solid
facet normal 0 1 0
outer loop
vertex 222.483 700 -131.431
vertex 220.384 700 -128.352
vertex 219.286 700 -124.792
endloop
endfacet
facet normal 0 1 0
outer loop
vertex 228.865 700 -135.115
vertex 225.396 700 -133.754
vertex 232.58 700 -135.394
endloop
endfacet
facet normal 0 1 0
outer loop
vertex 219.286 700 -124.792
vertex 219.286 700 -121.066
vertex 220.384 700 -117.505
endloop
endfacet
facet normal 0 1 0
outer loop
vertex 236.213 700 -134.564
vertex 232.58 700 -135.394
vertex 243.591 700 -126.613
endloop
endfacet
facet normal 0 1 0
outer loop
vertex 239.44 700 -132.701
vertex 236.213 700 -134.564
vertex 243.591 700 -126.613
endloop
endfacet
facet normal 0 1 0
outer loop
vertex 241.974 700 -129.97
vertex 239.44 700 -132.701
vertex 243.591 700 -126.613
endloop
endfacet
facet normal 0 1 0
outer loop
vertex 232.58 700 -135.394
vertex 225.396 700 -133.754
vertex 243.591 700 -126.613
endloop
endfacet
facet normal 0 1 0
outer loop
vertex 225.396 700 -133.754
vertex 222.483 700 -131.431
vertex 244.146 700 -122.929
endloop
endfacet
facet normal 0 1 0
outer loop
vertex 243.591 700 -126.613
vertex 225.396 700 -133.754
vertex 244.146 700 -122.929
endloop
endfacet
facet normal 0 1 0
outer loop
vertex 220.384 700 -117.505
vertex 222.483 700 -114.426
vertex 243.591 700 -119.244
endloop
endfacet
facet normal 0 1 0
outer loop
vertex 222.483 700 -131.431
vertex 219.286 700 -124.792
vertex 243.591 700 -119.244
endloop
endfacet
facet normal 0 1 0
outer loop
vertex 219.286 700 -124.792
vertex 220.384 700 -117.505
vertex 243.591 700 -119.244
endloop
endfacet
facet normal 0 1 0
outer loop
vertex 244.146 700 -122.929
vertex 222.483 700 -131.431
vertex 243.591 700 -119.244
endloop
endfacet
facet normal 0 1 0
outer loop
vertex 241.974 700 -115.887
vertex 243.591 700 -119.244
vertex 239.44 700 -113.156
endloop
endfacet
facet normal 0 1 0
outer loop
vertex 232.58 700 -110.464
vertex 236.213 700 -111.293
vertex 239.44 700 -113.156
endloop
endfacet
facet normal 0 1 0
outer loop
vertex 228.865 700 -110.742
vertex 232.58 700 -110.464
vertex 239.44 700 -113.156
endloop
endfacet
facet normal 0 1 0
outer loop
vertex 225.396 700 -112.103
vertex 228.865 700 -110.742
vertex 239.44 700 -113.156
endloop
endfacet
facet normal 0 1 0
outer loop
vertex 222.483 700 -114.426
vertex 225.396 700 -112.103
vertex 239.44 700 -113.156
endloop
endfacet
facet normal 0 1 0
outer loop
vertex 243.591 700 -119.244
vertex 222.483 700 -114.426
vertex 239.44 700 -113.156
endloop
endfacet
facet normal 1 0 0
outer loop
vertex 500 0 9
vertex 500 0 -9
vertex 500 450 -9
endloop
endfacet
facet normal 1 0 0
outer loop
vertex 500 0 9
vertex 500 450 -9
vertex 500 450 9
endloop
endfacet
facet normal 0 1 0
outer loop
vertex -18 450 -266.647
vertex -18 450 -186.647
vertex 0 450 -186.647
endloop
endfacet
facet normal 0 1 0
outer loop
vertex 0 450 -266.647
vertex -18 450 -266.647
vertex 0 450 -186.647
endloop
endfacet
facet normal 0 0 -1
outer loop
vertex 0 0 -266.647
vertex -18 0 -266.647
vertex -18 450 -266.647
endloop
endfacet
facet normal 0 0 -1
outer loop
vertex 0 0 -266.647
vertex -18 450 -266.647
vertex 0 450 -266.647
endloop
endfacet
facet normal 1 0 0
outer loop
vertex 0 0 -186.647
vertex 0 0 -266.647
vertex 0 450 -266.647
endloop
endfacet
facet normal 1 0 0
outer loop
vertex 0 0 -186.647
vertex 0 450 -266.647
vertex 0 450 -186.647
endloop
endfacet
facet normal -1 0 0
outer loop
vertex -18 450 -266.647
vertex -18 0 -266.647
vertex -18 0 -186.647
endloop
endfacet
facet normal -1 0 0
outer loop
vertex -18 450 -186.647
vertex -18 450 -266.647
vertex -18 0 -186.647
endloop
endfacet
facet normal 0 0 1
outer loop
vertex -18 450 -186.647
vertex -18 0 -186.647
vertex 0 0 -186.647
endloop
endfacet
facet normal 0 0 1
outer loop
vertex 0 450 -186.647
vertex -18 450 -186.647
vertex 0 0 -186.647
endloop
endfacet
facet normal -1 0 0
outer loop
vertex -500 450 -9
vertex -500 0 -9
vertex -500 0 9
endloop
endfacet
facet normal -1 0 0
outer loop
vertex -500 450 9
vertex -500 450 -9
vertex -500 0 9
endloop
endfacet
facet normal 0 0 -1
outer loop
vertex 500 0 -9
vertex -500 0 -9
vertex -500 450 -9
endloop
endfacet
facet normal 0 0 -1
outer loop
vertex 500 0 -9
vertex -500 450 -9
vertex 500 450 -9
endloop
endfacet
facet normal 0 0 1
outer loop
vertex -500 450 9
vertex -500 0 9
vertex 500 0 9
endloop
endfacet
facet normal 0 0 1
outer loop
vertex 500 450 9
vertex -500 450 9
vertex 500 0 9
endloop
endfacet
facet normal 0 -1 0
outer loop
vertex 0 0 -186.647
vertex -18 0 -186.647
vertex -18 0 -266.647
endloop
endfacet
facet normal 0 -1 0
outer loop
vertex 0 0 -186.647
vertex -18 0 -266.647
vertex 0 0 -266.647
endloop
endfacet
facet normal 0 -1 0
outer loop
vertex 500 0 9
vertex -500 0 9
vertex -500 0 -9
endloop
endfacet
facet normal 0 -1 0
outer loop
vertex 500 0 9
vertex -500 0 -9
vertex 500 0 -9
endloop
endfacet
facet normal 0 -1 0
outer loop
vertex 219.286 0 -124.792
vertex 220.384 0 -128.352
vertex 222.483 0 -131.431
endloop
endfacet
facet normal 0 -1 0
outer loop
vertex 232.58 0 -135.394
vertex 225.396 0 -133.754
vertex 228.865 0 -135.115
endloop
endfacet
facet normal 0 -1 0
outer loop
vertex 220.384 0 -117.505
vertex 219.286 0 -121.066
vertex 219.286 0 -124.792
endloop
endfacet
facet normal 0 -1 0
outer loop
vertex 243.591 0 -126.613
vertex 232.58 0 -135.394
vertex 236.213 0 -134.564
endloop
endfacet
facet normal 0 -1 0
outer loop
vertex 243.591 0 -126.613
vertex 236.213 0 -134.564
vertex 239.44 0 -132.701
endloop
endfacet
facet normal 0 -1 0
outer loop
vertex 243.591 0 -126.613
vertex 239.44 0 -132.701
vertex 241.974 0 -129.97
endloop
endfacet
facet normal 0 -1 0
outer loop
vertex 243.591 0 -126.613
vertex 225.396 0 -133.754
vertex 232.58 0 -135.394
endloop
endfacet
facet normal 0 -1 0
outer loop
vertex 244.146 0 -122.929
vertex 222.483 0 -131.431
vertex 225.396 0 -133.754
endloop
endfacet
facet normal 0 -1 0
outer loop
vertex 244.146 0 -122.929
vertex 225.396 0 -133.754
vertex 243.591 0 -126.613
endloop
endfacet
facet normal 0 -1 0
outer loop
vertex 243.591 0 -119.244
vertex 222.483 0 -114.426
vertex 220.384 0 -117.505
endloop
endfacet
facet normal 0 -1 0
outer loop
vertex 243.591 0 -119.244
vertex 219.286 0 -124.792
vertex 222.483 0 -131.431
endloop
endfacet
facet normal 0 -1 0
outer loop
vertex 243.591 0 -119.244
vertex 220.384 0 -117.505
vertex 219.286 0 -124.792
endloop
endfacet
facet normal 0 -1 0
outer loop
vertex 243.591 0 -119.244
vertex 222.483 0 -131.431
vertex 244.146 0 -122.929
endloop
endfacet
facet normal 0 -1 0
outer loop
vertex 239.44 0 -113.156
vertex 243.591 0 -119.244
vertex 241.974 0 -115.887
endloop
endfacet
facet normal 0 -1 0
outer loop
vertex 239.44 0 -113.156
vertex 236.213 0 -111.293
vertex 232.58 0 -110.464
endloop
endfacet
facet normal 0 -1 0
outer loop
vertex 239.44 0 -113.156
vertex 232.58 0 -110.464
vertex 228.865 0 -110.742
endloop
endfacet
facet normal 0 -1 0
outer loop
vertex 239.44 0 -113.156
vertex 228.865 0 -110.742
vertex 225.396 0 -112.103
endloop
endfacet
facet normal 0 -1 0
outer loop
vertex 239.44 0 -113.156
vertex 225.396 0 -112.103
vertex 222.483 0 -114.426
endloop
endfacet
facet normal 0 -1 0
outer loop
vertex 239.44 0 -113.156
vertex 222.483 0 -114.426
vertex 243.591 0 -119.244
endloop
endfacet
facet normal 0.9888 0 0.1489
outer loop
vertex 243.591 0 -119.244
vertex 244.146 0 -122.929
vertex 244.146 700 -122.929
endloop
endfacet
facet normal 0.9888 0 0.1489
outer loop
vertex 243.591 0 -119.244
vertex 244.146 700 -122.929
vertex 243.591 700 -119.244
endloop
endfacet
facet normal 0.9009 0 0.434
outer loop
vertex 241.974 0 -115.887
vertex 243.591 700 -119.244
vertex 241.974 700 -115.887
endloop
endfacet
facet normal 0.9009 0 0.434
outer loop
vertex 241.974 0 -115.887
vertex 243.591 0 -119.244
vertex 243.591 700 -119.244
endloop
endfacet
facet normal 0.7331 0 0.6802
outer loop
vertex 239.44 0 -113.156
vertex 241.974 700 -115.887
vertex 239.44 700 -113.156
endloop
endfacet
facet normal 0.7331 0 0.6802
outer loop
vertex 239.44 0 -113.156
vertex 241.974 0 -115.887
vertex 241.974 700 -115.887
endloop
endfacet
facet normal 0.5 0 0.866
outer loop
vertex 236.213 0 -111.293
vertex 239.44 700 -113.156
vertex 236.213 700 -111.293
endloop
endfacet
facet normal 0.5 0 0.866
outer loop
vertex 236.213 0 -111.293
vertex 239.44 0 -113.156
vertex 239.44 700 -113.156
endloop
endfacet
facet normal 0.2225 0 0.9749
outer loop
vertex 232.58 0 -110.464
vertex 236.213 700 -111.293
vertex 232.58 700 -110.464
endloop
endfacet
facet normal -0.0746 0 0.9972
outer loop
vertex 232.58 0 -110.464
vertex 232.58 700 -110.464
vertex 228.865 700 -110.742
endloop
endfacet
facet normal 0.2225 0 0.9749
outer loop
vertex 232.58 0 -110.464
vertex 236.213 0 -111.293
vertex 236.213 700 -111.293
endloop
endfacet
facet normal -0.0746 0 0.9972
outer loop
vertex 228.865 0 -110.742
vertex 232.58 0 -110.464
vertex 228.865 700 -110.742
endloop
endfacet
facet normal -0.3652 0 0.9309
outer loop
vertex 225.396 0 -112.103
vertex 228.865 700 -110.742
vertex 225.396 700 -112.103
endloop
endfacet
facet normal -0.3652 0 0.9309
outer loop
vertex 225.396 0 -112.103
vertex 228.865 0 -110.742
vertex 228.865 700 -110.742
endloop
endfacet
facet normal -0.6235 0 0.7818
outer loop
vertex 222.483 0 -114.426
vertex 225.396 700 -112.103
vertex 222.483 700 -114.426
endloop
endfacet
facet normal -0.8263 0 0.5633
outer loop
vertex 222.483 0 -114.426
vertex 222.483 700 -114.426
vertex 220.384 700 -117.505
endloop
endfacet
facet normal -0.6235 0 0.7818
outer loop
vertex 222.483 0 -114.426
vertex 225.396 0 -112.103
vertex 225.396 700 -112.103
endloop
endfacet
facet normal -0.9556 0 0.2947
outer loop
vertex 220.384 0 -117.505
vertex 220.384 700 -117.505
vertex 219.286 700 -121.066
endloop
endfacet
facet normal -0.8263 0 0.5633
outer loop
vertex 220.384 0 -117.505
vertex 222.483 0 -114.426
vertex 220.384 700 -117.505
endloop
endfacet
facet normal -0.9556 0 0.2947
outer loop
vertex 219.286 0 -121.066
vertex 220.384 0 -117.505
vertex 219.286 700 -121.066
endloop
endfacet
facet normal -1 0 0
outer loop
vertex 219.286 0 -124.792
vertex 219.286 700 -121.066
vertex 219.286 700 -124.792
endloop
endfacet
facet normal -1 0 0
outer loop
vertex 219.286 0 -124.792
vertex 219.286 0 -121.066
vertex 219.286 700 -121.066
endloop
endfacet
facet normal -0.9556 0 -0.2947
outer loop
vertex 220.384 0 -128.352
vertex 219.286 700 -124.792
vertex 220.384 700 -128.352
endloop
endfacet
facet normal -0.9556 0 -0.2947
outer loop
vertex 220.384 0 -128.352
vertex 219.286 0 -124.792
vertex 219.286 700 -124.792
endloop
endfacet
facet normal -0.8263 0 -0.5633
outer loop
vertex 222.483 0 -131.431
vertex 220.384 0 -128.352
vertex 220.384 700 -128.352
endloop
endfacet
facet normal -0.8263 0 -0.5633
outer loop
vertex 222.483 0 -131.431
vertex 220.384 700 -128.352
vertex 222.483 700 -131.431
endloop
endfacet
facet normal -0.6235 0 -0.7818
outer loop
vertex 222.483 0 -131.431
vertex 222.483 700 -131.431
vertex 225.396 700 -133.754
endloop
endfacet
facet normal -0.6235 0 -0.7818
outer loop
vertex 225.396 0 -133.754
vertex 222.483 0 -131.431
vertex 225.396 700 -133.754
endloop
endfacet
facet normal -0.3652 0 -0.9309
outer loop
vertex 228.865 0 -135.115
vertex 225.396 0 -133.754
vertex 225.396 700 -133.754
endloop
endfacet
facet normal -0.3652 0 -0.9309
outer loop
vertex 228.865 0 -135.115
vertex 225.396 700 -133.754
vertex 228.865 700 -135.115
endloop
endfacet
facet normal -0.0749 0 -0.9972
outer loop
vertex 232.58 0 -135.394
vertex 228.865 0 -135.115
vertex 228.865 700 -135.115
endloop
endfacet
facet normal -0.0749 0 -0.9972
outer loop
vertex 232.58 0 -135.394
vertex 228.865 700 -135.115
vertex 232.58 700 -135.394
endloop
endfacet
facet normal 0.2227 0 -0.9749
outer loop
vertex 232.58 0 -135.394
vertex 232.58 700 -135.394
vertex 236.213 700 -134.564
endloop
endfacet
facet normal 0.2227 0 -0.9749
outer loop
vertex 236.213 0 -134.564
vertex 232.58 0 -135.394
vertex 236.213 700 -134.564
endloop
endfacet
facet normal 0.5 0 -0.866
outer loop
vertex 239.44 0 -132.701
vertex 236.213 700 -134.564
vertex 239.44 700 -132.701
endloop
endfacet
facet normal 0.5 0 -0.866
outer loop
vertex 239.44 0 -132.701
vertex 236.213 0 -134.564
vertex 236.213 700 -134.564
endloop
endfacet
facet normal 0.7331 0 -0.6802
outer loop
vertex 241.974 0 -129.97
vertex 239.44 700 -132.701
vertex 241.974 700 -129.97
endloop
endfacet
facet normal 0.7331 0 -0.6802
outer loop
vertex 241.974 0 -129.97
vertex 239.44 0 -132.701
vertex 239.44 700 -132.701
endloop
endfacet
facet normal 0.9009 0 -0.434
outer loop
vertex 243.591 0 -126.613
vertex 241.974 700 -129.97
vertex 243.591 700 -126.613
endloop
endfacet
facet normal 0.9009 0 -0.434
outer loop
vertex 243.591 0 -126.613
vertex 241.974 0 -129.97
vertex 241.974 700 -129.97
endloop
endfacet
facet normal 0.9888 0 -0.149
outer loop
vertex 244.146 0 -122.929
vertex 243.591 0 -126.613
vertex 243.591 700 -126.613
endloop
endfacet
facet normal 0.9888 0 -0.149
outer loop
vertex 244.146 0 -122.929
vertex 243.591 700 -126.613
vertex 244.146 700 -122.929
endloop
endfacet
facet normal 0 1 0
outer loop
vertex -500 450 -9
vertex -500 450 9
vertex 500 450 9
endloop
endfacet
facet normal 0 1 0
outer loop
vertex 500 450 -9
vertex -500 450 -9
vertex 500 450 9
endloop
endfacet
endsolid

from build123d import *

# Parameters (mm, degrees)
F0_W     = 1000
F0_H     = 18
F1_DEPTH = 450
F2_W     = 18
F2_H     = 80
F3_DEPTH = 450
F4_R     = 12.5
F5_DEPTH = 700


with BuildPart() as f1:
    # F0 (on Front) → F1 (new body)
    with BuildSketch(Plane.XZ):
        Rectangle(F0_W, F0_H)
    extrude(amount=-F1_DEPTH)


with BuildPart() as f3:
    # F2 (on Front) → F3 (new body)
    with BuildSketch(Plane.XZ):
        with Locations((-9, -226.647379)):
            Rectangle(F2_W, F2_H)
    extrude(amount=-F3_DEPTH)


with BuildPart() as f5:
    # F4 (on Front) → F5 (new body)
    with BuildSketch(Plane.XZ):
        with Locations((231.64618, -122.92856)):
            Circle(F4_R)
    extrude(amount=-F5_DEPTH)


solid = Compound([f1.part, f3.part, f5.part])
